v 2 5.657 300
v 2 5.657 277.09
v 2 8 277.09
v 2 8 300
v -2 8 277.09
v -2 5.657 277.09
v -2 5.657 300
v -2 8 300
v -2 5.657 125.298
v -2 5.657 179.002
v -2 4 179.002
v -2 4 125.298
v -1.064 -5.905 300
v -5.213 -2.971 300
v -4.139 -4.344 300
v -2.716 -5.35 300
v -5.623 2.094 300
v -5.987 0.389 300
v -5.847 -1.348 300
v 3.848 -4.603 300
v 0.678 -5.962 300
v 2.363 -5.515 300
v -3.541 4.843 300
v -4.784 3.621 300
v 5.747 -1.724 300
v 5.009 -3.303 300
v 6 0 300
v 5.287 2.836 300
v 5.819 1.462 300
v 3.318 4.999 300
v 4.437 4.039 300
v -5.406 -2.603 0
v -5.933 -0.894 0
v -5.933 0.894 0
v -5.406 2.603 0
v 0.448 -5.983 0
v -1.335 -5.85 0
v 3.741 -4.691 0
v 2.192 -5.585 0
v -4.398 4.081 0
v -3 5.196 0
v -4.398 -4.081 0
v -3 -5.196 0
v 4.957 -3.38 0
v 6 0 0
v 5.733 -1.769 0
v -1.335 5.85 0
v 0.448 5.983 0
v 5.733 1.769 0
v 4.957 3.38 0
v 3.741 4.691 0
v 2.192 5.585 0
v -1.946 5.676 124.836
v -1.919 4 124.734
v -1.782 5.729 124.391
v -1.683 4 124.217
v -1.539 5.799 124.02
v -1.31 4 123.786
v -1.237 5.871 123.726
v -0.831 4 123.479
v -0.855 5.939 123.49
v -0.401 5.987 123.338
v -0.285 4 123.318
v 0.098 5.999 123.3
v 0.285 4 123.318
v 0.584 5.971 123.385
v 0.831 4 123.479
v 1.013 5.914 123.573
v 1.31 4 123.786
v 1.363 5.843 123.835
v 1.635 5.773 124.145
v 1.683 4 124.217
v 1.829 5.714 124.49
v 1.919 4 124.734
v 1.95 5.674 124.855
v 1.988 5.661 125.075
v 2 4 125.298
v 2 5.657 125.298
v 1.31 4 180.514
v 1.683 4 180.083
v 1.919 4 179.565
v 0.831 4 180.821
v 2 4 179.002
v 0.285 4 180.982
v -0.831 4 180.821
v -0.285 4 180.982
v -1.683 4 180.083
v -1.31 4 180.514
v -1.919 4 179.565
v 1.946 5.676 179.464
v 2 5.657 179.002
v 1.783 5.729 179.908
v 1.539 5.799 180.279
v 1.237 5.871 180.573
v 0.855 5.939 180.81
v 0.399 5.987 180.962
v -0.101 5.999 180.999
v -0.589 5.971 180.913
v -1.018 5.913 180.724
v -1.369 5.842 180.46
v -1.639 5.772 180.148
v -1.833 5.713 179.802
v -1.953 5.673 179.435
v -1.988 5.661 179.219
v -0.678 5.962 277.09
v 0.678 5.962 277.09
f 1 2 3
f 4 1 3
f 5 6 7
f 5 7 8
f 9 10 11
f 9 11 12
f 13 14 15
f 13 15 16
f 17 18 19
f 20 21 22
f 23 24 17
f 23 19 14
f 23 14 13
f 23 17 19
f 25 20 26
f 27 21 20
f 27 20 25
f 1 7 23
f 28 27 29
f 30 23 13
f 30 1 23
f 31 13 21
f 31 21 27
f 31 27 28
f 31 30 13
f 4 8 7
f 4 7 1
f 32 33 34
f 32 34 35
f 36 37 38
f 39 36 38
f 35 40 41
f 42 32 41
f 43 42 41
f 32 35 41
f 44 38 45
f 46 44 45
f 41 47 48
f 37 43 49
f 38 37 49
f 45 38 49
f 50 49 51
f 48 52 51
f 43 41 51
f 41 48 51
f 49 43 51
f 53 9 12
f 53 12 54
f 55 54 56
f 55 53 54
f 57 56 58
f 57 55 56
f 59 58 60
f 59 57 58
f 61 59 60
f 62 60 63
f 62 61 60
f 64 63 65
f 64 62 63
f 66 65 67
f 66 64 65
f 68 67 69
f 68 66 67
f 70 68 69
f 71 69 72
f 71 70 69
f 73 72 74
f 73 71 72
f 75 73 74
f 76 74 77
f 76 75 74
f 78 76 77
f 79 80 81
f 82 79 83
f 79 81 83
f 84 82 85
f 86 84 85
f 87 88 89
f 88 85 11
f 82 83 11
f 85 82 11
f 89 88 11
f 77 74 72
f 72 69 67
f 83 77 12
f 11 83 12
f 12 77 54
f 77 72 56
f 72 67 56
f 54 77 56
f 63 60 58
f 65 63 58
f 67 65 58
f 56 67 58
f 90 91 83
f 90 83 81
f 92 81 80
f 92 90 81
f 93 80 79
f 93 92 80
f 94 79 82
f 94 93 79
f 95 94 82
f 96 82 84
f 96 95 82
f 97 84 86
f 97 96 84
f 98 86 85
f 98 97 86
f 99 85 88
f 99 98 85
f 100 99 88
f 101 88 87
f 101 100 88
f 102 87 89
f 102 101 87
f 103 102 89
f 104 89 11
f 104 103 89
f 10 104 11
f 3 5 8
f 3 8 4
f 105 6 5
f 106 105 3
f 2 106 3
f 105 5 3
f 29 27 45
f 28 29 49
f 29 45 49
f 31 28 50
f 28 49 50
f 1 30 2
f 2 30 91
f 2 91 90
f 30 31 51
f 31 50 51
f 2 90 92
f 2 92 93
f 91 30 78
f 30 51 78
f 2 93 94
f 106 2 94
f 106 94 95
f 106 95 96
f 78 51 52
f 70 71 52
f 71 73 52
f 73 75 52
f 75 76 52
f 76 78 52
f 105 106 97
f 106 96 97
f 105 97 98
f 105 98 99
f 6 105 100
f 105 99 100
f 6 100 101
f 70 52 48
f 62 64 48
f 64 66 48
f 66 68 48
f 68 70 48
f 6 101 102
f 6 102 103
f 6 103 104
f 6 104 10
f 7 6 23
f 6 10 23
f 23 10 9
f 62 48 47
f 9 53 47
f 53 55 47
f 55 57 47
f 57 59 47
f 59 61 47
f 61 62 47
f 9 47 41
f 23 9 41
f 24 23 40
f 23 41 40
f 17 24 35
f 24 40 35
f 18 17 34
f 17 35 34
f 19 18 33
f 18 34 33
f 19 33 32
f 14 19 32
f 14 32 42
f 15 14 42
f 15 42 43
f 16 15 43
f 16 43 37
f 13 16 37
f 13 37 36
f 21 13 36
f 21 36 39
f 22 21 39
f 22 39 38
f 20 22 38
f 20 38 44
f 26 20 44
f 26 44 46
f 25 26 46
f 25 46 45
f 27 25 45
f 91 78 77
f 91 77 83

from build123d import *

# Parameters (mm, degrees)
SKETCH_1_R          = 6
EXTRUDE_1_DEPTH     = 300
SKETCH_2_W          = 4
SKETCH_2_H          = 5.416856643
EXTRUDE_2_DEPTH     = 22.91
CUT_EXTRUDE_START   = 6
CUT_EXTRUDE_1_DEPTH = 2


with BuildPart() as part:
    # 草图1 → 凸台-拉伸1 (new body)
    with BuildSketch(Plane.XY):
        Circle(SKETCH_1_R)
    extrude(amount=EXTRUDE_1_DEPTH)

    # 草图2 → 凸台-拉伸2 (add)
    with BuildSketch(Plane.XY.offset(300)):
        with Locations((0, 5.291571679)):
            Rectangle(SKETCH_2_W, SKETCH_2_H)
    extrude(amount=-EXTRUDE_2_DEPTH)

    # 草图3 → 切除-拉伸1 (cut)
    with BuildSketch(Plane(origin=(0, 0, 0), x_dir=(1, 0, 0), z_dir=(0, 1, 0)).offset(CUT_EXTRUDE_START)):
        with BuildLine():
            Line((2, -125.29796429), (2, -179.002027522))
            ThreePointArc((2, -179.002027522), (0, -181.002027522), (-2, -179.002027522))
            Line((-2, -179.002027522), (-2, -125.29796429))
            ThreePointArc((-2, -125.29796429), (0, -123.29796429), (2, -125.29796429))
        make_face()
    extrude(amount=-CUT_EXTRUDE_1_DEPTH, mode=Mode.SUBTRACT)


solid = part.part
